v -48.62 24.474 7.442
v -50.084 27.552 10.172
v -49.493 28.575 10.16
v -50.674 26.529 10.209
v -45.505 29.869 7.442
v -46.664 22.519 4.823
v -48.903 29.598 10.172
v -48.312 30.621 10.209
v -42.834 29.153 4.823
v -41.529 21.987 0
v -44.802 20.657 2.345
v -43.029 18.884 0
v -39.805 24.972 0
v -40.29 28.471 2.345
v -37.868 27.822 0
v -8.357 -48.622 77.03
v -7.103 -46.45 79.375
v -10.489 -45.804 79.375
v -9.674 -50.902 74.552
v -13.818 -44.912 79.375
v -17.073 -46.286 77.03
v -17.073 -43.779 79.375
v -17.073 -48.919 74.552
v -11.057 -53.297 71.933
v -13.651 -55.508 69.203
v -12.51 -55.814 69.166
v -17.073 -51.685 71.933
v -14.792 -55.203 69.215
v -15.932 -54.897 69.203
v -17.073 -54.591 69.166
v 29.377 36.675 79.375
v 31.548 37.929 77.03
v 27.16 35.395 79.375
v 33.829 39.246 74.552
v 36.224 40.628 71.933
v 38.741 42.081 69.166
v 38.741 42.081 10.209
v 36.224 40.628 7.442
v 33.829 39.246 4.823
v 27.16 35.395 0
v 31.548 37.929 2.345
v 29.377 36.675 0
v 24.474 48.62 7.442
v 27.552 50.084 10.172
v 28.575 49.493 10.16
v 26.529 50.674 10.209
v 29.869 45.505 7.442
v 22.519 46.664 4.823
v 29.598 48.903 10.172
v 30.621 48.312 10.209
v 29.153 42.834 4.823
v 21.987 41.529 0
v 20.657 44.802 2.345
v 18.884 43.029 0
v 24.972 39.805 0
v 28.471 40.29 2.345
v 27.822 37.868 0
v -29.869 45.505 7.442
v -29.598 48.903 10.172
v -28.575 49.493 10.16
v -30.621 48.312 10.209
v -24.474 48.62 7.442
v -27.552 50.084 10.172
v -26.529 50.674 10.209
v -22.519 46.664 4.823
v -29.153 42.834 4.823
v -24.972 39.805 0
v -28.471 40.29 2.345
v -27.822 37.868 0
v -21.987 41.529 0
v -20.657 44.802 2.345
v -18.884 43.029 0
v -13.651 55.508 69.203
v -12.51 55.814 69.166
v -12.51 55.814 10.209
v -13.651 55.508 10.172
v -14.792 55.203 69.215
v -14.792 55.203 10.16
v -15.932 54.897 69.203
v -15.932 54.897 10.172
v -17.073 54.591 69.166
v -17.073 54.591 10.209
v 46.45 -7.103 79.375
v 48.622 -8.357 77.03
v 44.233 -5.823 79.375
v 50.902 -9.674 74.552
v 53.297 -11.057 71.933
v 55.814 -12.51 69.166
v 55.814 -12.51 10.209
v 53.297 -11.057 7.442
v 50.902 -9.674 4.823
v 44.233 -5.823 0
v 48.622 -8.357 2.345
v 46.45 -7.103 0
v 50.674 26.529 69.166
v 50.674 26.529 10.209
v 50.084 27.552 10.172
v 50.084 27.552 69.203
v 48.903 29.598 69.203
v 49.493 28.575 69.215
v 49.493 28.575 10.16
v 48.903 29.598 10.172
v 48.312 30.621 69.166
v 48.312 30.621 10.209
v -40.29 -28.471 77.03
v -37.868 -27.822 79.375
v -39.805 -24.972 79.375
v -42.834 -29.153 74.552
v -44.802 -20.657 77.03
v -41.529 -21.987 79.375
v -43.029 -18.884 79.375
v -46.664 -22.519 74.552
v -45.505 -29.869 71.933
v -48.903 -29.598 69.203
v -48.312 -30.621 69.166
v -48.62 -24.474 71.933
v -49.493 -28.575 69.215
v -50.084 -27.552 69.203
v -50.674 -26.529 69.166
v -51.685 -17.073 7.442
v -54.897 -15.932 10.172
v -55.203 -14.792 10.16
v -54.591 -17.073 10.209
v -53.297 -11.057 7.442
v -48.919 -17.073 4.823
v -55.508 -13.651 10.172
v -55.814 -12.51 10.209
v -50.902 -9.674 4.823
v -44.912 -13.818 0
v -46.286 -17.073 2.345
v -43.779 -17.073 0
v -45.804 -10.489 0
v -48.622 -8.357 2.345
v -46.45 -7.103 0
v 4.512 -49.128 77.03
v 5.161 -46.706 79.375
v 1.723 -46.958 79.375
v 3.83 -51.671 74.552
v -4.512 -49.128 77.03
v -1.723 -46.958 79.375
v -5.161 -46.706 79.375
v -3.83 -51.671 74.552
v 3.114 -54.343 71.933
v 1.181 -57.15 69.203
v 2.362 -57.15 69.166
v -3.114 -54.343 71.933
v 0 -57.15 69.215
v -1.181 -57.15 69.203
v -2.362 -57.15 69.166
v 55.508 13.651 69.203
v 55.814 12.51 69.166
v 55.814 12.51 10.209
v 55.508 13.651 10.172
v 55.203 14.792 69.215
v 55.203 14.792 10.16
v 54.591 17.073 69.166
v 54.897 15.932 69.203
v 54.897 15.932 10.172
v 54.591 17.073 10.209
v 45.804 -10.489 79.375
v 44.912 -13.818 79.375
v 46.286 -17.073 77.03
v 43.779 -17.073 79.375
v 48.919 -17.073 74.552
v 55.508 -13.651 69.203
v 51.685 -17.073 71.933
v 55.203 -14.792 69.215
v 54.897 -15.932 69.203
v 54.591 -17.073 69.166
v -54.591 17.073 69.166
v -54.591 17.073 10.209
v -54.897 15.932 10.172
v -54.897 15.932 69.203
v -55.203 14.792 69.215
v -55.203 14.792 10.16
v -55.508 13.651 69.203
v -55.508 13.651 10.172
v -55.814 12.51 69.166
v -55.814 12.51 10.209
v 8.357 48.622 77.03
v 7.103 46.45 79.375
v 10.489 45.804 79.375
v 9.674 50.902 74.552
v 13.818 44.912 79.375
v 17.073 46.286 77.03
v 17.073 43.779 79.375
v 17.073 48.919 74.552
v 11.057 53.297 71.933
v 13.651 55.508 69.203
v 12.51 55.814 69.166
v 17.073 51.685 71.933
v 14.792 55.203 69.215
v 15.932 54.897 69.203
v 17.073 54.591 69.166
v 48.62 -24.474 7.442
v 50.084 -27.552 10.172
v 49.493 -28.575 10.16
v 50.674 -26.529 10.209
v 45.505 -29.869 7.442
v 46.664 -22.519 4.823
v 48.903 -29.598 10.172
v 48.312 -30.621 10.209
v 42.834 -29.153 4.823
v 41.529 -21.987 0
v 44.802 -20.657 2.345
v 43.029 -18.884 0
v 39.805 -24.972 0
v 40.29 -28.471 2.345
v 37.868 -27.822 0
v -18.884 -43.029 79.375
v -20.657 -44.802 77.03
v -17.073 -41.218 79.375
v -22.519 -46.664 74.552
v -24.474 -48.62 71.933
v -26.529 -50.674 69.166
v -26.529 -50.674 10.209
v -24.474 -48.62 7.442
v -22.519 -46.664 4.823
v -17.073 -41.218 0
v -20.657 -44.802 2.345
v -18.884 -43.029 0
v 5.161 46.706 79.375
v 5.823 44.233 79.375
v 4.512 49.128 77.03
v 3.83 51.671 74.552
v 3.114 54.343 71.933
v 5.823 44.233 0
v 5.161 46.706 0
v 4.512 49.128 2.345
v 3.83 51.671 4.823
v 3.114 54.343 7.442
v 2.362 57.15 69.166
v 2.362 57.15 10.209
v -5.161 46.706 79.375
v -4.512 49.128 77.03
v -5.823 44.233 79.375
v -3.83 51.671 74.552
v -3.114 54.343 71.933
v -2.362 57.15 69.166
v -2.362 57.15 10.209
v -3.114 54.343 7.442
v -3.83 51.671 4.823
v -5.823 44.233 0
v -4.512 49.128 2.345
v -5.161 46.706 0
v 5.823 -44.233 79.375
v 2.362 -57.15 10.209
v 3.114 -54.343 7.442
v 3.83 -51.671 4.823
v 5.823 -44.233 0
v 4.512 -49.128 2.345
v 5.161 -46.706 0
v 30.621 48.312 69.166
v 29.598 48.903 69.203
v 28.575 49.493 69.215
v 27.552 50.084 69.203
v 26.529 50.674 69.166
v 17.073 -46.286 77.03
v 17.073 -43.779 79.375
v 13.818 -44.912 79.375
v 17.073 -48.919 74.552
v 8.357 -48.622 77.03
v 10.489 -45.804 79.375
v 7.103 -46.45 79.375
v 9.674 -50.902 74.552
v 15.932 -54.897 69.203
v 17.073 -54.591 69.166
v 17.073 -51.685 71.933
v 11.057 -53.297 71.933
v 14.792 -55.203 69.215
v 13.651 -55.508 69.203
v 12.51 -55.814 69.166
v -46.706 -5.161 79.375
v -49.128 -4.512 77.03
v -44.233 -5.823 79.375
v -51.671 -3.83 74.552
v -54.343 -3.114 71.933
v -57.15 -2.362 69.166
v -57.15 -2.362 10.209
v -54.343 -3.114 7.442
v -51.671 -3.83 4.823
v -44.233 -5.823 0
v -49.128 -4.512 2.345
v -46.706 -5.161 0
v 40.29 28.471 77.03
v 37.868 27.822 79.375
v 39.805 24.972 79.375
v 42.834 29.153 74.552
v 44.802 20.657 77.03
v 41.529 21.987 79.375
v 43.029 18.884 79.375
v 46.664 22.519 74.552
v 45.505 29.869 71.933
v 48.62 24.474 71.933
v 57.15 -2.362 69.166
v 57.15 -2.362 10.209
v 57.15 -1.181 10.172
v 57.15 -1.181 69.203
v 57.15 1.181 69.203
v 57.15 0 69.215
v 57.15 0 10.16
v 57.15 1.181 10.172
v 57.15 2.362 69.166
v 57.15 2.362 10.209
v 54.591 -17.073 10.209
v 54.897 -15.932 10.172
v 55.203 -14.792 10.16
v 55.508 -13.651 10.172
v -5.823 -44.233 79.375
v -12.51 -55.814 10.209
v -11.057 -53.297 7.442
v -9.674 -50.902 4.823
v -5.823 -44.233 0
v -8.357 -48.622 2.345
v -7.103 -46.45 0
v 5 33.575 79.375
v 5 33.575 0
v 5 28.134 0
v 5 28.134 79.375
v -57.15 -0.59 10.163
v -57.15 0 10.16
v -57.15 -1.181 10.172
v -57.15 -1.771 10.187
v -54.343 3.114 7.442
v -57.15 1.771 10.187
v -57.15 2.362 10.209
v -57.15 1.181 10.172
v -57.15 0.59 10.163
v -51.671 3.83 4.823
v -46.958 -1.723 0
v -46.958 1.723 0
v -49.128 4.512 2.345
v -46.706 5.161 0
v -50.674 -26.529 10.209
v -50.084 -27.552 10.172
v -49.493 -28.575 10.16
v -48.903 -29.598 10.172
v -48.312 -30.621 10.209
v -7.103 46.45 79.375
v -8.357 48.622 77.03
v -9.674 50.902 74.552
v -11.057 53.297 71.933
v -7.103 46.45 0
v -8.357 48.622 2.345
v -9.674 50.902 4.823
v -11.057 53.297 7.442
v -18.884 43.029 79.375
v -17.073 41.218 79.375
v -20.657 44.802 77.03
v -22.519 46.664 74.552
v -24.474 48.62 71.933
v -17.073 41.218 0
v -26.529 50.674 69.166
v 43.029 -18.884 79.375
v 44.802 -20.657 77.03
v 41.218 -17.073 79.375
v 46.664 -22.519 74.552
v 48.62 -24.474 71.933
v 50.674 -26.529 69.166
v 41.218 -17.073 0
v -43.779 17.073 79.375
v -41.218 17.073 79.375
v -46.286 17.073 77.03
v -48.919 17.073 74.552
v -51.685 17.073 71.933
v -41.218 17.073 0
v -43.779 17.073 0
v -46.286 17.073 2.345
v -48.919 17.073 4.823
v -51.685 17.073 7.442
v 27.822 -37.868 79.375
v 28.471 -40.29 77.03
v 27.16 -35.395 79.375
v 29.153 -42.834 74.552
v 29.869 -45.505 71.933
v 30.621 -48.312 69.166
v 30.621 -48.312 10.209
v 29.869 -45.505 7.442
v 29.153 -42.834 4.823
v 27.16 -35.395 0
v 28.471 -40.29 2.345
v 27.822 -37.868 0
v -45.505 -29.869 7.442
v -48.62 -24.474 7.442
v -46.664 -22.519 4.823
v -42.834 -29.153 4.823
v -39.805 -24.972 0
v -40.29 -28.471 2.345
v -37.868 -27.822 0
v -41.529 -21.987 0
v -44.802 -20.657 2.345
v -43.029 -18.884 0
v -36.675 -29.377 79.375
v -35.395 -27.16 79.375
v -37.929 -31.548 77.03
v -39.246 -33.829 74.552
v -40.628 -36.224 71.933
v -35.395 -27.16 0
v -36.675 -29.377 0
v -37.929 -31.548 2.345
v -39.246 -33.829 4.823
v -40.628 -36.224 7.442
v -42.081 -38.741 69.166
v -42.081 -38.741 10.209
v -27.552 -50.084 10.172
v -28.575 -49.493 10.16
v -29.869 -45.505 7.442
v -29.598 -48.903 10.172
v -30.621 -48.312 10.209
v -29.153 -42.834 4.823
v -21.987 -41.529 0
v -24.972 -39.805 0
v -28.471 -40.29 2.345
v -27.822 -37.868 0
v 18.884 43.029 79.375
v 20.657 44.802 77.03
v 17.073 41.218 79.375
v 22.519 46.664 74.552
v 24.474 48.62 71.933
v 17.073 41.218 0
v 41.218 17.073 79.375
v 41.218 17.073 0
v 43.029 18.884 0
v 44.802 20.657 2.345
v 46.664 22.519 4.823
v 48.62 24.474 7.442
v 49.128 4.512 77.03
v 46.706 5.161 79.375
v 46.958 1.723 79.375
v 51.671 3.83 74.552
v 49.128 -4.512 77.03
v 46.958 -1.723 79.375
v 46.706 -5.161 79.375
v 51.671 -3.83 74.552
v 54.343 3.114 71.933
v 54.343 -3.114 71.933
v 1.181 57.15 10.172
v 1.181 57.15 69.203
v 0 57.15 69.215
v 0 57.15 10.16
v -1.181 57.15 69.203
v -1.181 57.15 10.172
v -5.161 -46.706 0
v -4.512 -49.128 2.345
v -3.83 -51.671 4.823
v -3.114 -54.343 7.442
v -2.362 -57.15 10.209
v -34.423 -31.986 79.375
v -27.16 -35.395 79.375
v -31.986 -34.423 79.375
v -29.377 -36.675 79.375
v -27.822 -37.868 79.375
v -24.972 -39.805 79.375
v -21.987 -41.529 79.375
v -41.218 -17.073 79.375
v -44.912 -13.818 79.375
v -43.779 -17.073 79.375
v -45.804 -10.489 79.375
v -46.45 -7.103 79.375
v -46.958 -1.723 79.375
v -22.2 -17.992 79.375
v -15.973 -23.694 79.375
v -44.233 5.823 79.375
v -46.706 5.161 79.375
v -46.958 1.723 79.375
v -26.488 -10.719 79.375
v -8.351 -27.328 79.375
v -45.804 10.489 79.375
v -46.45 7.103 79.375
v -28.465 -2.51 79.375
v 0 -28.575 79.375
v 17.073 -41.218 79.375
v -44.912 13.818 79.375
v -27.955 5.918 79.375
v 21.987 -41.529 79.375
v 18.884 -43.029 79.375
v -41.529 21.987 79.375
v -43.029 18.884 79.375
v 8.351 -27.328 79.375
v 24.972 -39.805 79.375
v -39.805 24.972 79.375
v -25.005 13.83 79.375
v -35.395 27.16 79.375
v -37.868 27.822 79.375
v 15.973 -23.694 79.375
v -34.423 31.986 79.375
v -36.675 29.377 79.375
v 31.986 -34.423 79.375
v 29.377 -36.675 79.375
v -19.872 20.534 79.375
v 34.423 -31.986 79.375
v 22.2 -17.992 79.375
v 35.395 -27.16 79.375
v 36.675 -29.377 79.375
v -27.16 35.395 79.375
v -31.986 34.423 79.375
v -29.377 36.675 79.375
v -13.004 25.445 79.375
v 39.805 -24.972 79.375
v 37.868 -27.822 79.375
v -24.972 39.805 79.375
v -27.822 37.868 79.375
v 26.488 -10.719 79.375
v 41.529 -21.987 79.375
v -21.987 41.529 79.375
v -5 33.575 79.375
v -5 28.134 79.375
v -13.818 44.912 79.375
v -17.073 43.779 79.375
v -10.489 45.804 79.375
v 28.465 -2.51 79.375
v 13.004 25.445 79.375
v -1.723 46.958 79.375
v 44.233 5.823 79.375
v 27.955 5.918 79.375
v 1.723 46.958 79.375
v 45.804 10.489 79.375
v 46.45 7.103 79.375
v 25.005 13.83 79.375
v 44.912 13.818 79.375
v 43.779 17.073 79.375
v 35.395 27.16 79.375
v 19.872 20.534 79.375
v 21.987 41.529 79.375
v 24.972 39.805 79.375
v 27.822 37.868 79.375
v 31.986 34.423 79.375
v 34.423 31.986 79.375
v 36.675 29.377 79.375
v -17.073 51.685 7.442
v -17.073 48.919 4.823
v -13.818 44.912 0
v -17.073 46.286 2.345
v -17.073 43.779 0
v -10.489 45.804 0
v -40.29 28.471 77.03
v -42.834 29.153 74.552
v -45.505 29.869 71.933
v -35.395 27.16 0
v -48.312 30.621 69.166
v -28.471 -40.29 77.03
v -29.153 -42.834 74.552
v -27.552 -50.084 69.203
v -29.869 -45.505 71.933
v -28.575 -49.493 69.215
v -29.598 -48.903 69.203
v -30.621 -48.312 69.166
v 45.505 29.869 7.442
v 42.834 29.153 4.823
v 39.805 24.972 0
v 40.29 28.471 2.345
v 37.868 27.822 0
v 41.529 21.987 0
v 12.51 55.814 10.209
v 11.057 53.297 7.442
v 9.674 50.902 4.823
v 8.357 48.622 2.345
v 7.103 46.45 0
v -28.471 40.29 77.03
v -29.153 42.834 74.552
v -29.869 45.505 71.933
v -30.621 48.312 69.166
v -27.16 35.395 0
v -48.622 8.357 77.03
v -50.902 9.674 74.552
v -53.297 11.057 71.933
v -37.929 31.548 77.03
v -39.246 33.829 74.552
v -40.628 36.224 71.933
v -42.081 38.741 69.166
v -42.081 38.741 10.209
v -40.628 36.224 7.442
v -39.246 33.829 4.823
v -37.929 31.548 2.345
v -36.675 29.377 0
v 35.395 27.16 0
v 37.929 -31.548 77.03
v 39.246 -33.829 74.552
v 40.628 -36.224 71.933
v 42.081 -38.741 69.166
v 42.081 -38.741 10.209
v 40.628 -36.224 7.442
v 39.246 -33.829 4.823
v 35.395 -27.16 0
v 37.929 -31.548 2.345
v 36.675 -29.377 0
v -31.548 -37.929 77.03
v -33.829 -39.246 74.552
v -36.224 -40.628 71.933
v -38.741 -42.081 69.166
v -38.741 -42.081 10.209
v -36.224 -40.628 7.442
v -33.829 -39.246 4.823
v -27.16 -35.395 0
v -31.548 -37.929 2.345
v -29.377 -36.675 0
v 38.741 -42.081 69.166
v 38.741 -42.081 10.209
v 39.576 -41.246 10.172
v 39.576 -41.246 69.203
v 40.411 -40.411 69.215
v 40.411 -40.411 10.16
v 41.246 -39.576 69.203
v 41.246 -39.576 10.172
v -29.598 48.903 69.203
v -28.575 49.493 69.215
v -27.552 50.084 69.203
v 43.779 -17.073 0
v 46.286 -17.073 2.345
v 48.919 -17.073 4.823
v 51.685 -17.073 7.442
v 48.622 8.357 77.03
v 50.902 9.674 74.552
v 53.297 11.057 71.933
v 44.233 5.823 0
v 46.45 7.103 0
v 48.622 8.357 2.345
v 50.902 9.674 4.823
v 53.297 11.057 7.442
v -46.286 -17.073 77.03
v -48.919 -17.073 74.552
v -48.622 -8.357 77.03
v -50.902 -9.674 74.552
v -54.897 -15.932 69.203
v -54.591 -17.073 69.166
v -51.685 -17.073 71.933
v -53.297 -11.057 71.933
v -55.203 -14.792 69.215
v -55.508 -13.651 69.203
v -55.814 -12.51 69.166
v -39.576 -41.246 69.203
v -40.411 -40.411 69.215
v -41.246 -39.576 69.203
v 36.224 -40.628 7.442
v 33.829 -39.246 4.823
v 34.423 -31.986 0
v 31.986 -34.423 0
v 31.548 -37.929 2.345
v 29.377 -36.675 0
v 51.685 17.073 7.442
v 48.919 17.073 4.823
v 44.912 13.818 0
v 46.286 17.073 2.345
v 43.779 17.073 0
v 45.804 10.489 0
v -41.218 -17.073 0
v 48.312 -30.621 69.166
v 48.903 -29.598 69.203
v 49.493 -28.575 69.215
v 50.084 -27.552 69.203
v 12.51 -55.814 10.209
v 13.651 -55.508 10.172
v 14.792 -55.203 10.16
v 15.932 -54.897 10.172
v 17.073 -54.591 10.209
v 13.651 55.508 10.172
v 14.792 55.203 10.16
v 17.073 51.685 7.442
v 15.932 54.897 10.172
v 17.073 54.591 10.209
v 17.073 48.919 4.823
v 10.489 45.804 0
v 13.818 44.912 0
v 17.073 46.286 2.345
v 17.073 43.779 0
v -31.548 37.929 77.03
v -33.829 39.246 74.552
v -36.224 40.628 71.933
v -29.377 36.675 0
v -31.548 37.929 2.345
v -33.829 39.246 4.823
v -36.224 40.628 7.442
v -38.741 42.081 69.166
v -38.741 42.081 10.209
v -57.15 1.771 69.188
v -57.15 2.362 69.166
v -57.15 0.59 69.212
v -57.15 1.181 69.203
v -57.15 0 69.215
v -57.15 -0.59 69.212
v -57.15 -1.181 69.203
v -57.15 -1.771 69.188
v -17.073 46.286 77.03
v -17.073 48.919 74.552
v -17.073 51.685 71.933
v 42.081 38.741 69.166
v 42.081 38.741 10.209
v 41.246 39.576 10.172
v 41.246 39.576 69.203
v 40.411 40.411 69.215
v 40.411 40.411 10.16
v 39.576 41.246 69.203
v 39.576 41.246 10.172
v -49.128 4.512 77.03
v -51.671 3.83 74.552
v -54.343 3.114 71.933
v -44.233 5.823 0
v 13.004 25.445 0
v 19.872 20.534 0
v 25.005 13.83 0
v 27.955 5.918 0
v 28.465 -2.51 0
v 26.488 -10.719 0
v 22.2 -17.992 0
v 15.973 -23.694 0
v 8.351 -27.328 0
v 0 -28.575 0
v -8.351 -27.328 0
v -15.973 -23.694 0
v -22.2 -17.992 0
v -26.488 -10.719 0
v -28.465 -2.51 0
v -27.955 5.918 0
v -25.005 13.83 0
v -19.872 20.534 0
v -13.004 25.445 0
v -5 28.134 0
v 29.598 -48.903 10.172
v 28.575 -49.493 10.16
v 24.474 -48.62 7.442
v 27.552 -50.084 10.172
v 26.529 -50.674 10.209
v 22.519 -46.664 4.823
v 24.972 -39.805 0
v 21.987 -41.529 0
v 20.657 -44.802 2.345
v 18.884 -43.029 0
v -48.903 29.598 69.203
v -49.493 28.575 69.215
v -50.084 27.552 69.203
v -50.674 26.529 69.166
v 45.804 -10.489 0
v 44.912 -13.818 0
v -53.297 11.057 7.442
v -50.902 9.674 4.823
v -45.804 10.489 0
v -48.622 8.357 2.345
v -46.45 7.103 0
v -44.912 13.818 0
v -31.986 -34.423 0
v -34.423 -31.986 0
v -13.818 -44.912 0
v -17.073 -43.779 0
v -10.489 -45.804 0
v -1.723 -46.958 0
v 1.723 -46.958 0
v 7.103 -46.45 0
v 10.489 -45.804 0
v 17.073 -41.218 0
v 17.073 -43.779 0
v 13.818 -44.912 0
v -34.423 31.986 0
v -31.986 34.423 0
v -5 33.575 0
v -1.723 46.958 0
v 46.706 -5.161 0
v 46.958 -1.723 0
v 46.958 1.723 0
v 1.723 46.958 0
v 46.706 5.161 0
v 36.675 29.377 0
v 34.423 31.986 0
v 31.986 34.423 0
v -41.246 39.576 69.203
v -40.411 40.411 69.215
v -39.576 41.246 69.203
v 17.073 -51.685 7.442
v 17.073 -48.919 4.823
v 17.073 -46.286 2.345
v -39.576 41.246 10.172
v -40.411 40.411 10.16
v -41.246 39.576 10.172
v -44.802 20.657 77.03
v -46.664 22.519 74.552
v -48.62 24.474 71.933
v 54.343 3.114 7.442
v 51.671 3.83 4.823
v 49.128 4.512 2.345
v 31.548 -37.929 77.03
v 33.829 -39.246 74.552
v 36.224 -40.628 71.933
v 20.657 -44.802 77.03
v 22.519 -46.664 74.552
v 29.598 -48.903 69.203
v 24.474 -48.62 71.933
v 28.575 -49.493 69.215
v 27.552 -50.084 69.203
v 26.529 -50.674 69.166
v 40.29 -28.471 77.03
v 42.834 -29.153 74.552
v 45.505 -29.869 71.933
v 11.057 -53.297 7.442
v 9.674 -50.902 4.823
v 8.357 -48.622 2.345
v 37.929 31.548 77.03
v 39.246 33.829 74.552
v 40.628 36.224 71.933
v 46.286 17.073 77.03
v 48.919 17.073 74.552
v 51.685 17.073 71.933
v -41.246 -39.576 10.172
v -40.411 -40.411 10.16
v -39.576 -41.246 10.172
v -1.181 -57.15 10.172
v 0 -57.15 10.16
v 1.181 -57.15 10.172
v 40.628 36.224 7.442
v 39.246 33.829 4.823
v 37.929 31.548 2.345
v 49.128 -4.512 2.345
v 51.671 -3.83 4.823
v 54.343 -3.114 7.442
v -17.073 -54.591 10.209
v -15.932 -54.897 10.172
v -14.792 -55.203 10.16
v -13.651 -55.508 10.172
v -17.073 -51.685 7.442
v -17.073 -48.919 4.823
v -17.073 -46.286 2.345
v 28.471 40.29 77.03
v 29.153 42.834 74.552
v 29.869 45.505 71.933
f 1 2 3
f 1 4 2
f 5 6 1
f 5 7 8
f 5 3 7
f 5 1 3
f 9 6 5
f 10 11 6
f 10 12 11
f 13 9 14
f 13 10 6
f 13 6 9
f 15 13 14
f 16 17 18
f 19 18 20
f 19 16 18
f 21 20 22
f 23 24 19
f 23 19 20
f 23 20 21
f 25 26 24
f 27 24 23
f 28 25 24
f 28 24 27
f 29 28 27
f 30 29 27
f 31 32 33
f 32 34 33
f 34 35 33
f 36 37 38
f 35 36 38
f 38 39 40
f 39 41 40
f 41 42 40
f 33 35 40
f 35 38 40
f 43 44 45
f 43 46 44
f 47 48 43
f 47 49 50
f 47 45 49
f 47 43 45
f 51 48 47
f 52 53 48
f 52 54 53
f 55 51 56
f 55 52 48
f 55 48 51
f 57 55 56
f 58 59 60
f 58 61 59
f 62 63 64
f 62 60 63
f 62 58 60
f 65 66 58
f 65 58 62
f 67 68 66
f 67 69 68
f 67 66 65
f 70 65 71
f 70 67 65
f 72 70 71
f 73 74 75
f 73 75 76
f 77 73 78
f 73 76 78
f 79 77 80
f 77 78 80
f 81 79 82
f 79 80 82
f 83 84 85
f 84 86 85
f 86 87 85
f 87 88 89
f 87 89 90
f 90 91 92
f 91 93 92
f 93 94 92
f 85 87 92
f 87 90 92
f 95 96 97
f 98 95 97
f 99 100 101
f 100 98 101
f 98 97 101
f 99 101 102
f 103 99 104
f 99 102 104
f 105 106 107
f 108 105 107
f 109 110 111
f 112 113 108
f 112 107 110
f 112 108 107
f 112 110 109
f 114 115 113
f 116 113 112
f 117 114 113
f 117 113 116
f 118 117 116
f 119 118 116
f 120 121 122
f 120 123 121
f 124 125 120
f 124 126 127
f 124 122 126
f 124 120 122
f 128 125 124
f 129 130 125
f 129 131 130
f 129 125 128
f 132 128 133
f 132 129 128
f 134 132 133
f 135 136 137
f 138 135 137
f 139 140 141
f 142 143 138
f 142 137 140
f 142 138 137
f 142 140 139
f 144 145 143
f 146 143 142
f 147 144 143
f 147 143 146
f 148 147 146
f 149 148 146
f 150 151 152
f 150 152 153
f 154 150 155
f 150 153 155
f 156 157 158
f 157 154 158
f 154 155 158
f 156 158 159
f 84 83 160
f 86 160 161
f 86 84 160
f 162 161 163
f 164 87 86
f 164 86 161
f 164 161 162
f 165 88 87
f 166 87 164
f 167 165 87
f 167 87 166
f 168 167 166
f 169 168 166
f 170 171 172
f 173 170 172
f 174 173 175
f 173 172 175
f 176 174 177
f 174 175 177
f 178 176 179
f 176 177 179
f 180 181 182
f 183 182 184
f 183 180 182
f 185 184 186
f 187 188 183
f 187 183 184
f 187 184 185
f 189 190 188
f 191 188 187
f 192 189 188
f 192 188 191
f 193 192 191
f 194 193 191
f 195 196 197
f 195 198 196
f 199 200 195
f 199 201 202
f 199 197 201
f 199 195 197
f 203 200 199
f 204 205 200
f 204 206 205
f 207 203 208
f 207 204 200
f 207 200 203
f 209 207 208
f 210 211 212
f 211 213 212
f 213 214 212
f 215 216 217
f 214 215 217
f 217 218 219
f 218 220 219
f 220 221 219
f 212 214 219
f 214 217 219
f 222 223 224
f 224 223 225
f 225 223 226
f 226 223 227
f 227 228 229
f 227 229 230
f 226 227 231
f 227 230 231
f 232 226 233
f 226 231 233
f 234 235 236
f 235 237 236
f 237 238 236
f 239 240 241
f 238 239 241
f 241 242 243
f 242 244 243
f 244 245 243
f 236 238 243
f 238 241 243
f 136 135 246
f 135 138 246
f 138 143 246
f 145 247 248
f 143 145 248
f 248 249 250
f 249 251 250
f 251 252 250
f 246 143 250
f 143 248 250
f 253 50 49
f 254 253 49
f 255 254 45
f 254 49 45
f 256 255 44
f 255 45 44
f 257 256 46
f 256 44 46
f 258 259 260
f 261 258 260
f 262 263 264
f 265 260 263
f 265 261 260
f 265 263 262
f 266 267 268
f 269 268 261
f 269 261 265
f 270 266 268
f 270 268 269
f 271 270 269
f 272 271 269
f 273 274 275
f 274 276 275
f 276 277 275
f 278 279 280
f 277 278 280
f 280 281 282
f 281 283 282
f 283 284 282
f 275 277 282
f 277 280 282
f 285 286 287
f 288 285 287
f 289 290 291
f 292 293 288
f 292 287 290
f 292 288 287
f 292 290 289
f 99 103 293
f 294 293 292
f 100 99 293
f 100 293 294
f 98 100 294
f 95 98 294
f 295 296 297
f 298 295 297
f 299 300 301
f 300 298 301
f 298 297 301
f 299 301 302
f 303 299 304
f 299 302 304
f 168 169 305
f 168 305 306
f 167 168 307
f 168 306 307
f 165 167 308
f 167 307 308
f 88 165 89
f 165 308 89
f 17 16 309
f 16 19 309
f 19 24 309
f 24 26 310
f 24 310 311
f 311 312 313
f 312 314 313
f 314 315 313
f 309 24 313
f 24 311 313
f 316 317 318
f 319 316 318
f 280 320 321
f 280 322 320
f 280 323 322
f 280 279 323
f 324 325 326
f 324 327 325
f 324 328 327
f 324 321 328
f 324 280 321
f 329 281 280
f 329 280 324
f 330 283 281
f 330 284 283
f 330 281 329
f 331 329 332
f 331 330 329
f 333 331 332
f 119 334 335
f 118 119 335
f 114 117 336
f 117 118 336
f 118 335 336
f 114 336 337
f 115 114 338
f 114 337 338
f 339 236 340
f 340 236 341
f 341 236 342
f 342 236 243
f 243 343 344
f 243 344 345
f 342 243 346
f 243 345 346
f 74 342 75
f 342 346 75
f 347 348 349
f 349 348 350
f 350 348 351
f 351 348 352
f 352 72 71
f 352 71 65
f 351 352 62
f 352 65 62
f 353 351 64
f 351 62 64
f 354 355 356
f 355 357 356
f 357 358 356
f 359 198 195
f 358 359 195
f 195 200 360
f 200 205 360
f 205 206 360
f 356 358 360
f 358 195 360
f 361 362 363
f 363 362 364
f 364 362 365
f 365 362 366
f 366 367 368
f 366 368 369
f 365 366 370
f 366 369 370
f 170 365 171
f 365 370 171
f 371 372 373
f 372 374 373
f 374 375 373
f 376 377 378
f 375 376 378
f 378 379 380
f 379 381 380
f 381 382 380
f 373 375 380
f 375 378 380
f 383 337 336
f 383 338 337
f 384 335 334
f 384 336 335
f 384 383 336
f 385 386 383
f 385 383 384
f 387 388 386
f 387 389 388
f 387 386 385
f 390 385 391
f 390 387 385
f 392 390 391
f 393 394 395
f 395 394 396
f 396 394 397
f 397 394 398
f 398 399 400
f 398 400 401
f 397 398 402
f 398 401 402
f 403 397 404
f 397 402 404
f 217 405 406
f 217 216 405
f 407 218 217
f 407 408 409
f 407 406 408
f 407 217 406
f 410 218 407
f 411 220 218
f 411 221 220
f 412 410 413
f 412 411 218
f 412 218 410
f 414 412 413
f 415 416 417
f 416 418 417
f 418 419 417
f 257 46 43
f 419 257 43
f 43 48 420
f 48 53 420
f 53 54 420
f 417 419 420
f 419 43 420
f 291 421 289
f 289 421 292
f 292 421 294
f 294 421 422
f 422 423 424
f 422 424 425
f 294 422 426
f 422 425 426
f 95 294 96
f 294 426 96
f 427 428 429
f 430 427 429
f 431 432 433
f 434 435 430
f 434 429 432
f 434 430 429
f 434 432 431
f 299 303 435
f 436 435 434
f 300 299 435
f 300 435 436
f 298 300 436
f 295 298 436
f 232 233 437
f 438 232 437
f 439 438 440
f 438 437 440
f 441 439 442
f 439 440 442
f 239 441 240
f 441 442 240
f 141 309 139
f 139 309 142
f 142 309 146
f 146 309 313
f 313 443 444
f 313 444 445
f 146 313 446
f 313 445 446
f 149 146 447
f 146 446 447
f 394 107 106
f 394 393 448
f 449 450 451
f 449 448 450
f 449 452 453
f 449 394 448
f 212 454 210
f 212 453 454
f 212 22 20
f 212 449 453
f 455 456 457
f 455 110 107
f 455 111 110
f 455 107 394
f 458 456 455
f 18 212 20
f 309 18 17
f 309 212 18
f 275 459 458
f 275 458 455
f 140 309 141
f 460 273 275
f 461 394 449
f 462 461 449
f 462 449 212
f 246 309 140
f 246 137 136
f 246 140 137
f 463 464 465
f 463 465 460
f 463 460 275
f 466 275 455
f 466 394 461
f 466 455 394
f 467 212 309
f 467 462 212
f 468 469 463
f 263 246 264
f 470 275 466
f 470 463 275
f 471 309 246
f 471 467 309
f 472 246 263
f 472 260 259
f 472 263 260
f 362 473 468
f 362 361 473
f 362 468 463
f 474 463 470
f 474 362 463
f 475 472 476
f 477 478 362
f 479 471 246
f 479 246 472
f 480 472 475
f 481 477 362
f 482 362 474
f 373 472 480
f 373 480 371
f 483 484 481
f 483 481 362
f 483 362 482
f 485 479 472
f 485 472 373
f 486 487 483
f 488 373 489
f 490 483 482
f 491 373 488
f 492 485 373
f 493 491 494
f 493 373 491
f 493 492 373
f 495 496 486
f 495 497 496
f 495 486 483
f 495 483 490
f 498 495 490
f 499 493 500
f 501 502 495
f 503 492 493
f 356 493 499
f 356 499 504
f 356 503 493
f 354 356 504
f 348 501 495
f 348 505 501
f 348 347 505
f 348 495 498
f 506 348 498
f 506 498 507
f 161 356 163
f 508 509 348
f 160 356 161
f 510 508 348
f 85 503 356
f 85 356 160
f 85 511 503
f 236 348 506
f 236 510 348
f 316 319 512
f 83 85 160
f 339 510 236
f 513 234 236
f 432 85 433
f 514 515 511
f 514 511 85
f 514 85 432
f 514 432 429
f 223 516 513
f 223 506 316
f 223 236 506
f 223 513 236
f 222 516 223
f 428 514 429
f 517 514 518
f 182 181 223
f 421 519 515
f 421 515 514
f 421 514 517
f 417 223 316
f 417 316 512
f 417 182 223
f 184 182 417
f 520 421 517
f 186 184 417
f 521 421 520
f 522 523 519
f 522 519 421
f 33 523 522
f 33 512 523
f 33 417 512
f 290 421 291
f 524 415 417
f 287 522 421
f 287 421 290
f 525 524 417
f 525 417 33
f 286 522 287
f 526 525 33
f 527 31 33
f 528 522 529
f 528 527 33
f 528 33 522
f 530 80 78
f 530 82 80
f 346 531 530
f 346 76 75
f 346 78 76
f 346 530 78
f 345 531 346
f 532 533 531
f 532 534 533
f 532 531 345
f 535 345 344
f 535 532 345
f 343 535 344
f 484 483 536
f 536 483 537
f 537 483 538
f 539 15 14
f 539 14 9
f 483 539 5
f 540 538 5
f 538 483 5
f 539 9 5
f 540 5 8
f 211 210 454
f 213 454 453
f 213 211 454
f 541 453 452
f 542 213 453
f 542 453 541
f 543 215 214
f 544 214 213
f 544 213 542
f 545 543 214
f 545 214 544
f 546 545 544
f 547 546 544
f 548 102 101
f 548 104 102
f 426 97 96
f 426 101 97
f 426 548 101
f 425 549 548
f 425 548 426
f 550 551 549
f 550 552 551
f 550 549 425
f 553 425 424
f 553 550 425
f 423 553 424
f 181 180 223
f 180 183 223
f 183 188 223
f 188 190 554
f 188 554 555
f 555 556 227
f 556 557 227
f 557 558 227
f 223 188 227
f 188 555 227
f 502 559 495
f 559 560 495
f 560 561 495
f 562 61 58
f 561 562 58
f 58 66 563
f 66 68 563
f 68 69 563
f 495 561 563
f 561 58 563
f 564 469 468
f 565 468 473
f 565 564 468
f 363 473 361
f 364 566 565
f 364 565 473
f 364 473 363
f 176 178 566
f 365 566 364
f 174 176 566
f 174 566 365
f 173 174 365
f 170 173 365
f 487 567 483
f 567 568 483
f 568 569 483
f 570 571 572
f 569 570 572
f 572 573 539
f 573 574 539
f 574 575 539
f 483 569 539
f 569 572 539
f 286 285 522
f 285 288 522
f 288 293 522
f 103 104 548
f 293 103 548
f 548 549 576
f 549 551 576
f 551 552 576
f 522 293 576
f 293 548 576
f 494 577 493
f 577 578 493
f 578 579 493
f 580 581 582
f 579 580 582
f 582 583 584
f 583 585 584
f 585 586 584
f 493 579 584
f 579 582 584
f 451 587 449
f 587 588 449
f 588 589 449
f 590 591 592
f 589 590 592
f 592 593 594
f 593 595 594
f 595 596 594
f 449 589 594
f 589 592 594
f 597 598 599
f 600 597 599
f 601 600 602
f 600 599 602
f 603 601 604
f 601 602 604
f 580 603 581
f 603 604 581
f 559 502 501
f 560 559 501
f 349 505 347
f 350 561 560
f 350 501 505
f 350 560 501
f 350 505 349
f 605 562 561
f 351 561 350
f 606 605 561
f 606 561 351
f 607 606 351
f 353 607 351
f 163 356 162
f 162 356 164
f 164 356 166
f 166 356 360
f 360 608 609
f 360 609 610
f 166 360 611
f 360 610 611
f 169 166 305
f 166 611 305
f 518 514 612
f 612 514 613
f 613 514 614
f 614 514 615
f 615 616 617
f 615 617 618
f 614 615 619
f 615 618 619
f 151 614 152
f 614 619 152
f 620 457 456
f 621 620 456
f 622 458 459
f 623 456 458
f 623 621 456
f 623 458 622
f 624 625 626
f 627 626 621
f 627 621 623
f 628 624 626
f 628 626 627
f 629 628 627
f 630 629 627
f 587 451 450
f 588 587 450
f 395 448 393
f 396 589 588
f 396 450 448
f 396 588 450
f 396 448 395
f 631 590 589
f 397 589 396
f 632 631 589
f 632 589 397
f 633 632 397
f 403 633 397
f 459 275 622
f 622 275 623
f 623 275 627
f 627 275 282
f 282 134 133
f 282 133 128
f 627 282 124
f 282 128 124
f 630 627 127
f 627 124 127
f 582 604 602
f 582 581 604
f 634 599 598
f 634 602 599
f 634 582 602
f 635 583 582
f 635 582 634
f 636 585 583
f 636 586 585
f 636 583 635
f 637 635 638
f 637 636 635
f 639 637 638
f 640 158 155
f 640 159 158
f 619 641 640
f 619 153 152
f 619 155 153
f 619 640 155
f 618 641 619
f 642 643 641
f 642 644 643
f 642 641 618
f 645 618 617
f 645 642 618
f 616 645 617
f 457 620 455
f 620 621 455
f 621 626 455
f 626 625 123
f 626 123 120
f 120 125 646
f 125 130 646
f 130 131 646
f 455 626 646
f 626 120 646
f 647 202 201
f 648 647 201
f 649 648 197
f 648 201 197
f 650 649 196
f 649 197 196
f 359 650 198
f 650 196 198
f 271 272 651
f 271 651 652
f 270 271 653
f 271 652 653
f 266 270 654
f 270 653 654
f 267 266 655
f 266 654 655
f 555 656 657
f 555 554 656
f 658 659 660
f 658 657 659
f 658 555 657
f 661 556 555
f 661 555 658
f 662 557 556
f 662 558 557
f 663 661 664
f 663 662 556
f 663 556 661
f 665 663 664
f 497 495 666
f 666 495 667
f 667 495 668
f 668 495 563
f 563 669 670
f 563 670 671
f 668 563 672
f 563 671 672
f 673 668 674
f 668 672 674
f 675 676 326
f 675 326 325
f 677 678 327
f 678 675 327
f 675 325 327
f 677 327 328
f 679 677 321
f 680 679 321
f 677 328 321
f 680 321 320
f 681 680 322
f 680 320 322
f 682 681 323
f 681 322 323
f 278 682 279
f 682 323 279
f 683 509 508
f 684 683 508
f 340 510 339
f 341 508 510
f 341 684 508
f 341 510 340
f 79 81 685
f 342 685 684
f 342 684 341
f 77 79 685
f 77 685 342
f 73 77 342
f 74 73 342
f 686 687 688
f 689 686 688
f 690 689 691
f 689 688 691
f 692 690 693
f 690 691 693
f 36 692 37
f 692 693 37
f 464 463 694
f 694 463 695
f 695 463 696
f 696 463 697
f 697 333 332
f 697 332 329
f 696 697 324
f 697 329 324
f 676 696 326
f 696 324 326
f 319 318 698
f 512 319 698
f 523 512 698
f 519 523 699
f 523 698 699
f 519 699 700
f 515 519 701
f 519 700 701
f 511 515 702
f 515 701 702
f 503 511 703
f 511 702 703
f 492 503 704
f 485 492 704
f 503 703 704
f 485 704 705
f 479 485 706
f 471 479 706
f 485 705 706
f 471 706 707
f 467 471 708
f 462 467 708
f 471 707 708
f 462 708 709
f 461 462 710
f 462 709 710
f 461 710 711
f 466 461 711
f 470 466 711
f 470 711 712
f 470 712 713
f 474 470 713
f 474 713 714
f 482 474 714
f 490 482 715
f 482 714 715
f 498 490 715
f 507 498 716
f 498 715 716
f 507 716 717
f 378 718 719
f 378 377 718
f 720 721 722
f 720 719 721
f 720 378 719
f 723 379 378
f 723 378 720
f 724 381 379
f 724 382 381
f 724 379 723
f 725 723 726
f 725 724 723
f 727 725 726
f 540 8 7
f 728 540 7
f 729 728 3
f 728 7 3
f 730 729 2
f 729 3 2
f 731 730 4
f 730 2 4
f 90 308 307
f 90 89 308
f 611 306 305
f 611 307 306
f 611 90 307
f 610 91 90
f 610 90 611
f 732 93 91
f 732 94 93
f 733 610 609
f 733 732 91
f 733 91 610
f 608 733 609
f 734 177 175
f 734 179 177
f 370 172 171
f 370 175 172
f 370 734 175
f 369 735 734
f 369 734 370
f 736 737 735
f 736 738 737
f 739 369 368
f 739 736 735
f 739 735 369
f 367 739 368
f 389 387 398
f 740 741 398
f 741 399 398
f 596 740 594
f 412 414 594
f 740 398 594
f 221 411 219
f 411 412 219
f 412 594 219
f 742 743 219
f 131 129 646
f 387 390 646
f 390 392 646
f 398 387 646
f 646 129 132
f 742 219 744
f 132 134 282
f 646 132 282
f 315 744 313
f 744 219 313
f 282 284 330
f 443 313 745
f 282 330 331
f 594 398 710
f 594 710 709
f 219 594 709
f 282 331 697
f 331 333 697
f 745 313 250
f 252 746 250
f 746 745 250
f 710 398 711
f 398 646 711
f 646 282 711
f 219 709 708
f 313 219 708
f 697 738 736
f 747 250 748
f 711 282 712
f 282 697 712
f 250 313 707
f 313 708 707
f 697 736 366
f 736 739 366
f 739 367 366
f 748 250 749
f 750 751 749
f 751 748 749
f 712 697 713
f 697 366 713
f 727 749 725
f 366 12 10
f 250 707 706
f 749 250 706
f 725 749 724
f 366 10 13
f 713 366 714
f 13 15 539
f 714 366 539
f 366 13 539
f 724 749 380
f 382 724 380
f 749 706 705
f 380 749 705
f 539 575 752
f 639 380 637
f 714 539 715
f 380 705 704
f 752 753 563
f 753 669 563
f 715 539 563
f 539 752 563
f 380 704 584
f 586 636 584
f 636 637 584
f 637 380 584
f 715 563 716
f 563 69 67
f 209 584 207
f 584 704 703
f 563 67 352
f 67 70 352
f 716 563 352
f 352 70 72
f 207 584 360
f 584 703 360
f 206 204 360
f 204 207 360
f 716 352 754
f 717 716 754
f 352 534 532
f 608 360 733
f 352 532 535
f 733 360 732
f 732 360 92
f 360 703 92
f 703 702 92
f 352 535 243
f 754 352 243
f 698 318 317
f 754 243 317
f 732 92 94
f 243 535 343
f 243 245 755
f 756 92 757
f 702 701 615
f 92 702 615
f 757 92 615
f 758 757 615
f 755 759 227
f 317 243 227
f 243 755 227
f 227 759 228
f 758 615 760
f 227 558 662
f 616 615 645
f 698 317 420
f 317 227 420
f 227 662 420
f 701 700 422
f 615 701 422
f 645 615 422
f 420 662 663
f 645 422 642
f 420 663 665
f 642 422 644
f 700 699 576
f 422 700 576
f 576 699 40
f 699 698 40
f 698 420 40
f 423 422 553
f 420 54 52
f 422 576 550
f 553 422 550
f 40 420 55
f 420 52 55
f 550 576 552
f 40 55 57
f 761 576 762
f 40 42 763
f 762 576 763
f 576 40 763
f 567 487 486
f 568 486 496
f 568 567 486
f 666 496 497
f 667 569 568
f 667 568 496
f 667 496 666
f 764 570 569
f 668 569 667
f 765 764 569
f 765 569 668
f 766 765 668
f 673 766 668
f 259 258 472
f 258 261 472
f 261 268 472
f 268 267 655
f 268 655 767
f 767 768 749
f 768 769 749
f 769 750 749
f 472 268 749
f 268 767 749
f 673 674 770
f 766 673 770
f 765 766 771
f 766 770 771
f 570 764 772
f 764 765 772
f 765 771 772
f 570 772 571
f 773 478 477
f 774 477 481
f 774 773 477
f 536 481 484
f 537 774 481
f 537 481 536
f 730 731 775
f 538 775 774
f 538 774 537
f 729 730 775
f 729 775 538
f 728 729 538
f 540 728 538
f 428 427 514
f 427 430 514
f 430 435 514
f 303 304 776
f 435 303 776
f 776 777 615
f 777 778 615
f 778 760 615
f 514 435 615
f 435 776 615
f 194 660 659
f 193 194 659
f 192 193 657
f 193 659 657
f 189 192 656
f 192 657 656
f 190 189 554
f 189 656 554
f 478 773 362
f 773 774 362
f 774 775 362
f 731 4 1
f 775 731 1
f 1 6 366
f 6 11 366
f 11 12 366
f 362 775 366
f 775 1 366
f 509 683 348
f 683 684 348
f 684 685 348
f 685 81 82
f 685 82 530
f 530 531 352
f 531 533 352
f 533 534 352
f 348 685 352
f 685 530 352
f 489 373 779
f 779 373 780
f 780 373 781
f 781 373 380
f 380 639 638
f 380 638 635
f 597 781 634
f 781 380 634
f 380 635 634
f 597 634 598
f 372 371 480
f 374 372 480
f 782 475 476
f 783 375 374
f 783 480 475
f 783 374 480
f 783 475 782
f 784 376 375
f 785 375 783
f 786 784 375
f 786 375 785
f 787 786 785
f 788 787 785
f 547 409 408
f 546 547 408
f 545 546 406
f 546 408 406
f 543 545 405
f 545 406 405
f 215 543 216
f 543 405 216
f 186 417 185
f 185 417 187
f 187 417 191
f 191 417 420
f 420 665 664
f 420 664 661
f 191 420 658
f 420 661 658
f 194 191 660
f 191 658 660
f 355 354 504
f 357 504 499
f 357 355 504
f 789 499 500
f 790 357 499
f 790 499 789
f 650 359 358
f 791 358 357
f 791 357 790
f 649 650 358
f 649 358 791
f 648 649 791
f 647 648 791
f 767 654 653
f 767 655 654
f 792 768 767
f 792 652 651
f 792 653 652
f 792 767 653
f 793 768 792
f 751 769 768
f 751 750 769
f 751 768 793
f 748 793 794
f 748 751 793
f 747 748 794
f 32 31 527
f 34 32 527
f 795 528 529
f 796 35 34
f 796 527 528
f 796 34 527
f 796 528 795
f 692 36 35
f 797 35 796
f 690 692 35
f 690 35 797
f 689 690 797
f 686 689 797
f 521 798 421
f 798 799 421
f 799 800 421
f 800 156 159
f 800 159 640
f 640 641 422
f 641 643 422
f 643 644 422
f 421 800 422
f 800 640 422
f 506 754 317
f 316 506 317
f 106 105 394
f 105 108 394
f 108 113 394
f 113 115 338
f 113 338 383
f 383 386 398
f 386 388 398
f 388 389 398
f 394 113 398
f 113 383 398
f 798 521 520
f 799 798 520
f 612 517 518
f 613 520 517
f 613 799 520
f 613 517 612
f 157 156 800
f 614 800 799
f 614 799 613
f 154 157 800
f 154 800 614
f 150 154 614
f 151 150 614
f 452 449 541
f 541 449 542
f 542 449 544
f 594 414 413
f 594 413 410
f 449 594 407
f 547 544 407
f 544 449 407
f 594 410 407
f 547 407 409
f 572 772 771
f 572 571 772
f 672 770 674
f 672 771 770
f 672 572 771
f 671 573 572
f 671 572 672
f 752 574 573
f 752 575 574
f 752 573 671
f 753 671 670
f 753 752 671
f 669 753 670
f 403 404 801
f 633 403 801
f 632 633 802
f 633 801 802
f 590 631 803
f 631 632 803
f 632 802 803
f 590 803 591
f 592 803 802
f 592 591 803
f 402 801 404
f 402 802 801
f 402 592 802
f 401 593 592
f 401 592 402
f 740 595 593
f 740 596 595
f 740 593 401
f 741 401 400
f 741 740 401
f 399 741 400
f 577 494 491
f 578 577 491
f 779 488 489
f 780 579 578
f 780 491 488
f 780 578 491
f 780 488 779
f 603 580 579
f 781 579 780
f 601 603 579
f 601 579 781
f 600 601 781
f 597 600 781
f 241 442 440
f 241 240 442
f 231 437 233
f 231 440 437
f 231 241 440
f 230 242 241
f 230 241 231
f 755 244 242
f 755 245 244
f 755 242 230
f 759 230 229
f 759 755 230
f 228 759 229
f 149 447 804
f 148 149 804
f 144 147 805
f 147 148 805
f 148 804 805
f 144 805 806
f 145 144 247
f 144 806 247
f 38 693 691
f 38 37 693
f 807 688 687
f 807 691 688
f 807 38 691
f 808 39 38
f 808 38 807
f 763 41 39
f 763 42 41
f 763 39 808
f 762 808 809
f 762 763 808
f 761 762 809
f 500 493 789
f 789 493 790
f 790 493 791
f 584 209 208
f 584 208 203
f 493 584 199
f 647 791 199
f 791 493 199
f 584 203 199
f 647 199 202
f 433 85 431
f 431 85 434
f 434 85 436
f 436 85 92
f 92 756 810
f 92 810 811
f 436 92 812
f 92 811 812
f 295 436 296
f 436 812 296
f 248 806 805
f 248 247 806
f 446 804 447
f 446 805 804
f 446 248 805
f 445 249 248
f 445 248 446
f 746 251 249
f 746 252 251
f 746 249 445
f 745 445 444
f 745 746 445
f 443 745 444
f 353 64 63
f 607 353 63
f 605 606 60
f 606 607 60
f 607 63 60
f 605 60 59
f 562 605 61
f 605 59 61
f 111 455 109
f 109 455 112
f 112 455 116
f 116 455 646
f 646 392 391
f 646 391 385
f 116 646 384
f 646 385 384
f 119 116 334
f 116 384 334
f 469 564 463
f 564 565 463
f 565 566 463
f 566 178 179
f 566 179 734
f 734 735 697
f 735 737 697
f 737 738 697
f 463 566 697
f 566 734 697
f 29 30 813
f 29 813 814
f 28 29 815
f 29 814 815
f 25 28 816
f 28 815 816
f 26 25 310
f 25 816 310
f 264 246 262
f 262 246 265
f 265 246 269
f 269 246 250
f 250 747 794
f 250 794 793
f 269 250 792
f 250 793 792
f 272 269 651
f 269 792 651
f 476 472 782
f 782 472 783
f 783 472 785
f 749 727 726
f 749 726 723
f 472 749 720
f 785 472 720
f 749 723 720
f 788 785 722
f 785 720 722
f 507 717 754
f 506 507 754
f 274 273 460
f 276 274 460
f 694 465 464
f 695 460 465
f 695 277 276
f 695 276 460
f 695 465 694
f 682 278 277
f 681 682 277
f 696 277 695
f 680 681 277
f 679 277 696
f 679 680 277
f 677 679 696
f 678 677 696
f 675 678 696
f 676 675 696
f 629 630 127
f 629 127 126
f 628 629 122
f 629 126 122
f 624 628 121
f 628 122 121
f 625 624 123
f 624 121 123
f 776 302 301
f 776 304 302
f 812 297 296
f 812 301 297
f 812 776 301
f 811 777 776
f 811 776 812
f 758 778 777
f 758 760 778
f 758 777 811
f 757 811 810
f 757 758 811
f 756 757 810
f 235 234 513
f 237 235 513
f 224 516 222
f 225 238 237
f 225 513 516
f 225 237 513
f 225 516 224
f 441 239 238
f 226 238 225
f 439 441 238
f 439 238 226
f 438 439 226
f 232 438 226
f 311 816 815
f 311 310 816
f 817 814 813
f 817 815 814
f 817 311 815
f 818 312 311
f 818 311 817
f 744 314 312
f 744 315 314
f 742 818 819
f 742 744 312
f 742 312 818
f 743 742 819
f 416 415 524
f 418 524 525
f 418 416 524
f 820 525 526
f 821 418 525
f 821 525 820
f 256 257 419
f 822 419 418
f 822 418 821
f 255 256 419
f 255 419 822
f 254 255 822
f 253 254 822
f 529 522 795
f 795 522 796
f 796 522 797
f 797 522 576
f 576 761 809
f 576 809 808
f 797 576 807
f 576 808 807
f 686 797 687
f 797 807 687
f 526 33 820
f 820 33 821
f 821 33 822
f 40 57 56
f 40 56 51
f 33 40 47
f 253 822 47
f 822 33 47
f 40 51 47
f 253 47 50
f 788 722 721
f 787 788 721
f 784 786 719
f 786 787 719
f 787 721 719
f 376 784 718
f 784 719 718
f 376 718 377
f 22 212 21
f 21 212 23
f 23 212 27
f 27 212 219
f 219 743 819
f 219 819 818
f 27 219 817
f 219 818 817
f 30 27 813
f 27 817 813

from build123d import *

# Parameters (mm, degrees)
F1_DEPTH = 79.375


with BuildPart() as f1:
    # F0 (on Top) → F1 (new body)
    with BuildSketch(Plane.XY):
        Polygon((2.3622, 57.15), (-2.3622, 57.15), (-5.823357, 44.232787), (-12.509798, 55.814043), (-17.073218, 54.591279), (-17.073218, 41.218395), (-26.529275, 50.674452), (-30.620725, 48.312252), (-27.159568, 35.395039), (-38.740825, 42.08148), (-42.08148, 38.740825), (-35.395039, 27.159568), (-48.312252, 30.620725), (-50.674452, 26.529275), (-41.218395, 17.073218), (-54.591279, 17.073218), (-55.814043, 12.509798), (-44.232787, 5.823357), (-57.15, 2.3622), (-57.15, -2.3622), (-44.232787, -5.823357), (-55.814043, -12.509798), (-54.591279, -17.073218), (-41.218395, -17.073218), (-50.674452, -26.529275), (-48.312252, -30.620725), (-35.395039, -27.159568), (-42.08148, -38.740825), (-38.740825, -42.08148), (-27.159568, -35.395039), (-30.620725, -48.312252), (-26.529275, -50.674452), (-17.073218, -41.218395), (-17.073218, -54.591279), (-12.509798, -55.814043), (-5.823357, -44.232787), (-2.3622, -57.15), (2.3622, -57.15), (5.823357, -44.232787), (12.509798, -55.814043), (17.073218, -54.591279), (17.073218, -41.218395), (26.529275, -50.674452), (30.620725, -48.312252), (27.159568, -35.395039), (38.740825, -42.08148), (42.08148, -38.740825), (35.395039, -27.159568), (48.312252, -30.620725), (50.674452, -26.529275), (41.218395, -17.073218), (54.591279, -17.073218), (55.814043, -12.509798), (44.232787, -5.823357), (57.15, -2.3622), (57.15, 2.3622), (44.232787, 5.823357), (55.814043, 12.509798), (54.591279, 17.073218), (41.218395, 17.073218), (50.674452, 26.529275), (48.312252, 30.620725), (35.395039, 27.159568), (42.08148, 38.740825), (38.740825, 42.08148), (27.159568, 35.395039), (30.620725, 48.312252), (26.529275, 50.674452), (17.073218, 41.218395), (17.073218, 54.591279), (12.509798, 55.814043), (5.823357, 44.232787), align=None)
        with BuildLine():
            Line((-5, 33.575), (5, 33.575))
            Line((5, 33.575), (5, 28.134154))
            ThreePointArc((5, 28.134154), (0, -28.575), (-5, 28.134154))
            Line((-5, 28.134154), (-5, 33.575))
        make_face(mode=Mode.SUBTRACT)
    extrude(amount=F1_DEPTH)

    # F2 (on Front) → F3 (revolve, intersect)
    with BuildSketch(Plane.XZ):
        Polygon((0, -46.99), (0, 126.365), (-86.6775, 39.6875), align=None)
    revolve(axis=Axis((0, 0, 39.6875), (0, 0, -1)), mode=Mode.INTERSECT)


solid = f1.part
